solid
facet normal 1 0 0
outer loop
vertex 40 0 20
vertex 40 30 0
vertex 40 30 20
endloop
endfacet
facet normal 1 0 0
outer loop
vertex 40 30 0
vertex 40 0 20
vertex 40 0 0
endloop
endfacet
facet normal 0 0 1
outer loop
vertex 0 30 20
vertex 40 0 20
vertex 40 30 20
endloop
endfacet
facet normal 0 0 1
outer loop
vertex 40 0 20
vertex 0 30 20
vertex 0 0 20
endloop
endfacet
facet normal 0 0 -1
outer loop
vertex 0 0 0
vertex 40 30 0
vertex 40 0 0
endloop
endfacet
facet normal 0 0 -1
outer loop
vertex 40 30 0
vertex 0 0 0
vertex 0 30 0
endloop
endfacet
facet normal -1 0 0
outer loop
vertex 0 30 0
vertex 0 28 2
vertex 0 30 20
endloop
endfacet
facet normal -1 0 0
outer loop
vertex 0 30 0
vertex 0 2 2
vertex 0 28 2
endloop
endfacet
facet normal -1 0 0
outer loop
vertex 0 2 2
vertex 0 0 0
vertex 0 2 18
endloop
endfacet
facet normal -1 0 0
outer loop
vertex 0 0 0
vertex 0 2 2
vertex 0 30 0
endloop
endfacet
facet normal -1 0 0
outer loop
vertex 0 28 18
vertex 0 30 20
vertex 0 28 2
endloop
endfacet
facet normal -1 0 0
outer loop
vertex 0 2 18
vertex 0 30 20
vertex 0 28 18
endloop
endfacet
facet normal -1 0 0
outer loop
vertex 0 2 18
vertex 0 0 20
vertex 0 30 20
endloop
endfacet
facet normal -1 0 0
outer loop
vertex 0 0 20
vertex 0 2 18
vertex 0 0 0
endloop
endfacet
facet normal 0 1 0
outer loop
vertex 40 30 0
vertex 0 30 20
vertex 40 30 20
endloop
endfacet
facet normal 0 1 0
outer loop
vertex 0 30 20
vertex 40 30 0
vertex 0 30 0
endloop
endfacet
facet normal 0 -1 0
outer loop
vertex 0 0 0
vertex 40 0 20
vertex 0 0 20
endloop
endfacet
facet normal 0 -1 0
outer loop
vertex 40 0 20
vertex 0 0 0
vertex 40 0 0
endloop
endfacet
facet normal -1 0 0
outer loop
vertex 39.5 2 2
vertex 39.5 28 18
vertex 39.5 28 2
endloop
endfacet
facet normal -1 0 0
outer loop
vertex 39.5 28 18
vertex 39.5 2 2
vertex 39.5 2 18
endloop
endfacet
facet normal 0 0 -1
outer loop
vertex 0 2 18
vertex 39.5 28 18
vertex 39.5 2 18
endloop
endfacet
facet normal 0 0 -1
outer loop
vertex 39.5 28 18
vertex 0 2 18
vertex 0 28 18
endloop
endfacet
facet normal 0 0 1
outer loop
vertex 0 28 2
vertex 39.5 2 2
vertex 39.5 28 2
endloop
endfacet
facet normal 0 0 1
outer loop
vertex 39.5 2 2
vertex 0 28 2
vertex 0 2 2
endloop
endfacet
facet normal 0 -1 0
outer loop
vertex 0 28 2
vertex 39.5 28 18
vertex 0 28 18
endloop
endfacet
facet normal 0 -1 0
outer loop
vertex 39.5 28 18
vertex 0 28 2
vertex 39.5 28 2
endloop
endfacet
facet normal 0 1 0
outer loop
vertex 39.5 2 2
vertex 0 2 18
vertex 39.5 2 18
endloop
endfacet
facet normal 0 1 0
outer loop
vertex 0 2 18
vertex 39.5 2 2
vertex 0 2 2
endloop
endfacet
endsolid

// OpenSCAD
// units=mm — generated by scad_emitter.py
// part=unnamed
$fn = 48;

difference() { cube([40, 30, 20]); translate([-0.5, 2, 2]) cube([40, 26, 16]); }
